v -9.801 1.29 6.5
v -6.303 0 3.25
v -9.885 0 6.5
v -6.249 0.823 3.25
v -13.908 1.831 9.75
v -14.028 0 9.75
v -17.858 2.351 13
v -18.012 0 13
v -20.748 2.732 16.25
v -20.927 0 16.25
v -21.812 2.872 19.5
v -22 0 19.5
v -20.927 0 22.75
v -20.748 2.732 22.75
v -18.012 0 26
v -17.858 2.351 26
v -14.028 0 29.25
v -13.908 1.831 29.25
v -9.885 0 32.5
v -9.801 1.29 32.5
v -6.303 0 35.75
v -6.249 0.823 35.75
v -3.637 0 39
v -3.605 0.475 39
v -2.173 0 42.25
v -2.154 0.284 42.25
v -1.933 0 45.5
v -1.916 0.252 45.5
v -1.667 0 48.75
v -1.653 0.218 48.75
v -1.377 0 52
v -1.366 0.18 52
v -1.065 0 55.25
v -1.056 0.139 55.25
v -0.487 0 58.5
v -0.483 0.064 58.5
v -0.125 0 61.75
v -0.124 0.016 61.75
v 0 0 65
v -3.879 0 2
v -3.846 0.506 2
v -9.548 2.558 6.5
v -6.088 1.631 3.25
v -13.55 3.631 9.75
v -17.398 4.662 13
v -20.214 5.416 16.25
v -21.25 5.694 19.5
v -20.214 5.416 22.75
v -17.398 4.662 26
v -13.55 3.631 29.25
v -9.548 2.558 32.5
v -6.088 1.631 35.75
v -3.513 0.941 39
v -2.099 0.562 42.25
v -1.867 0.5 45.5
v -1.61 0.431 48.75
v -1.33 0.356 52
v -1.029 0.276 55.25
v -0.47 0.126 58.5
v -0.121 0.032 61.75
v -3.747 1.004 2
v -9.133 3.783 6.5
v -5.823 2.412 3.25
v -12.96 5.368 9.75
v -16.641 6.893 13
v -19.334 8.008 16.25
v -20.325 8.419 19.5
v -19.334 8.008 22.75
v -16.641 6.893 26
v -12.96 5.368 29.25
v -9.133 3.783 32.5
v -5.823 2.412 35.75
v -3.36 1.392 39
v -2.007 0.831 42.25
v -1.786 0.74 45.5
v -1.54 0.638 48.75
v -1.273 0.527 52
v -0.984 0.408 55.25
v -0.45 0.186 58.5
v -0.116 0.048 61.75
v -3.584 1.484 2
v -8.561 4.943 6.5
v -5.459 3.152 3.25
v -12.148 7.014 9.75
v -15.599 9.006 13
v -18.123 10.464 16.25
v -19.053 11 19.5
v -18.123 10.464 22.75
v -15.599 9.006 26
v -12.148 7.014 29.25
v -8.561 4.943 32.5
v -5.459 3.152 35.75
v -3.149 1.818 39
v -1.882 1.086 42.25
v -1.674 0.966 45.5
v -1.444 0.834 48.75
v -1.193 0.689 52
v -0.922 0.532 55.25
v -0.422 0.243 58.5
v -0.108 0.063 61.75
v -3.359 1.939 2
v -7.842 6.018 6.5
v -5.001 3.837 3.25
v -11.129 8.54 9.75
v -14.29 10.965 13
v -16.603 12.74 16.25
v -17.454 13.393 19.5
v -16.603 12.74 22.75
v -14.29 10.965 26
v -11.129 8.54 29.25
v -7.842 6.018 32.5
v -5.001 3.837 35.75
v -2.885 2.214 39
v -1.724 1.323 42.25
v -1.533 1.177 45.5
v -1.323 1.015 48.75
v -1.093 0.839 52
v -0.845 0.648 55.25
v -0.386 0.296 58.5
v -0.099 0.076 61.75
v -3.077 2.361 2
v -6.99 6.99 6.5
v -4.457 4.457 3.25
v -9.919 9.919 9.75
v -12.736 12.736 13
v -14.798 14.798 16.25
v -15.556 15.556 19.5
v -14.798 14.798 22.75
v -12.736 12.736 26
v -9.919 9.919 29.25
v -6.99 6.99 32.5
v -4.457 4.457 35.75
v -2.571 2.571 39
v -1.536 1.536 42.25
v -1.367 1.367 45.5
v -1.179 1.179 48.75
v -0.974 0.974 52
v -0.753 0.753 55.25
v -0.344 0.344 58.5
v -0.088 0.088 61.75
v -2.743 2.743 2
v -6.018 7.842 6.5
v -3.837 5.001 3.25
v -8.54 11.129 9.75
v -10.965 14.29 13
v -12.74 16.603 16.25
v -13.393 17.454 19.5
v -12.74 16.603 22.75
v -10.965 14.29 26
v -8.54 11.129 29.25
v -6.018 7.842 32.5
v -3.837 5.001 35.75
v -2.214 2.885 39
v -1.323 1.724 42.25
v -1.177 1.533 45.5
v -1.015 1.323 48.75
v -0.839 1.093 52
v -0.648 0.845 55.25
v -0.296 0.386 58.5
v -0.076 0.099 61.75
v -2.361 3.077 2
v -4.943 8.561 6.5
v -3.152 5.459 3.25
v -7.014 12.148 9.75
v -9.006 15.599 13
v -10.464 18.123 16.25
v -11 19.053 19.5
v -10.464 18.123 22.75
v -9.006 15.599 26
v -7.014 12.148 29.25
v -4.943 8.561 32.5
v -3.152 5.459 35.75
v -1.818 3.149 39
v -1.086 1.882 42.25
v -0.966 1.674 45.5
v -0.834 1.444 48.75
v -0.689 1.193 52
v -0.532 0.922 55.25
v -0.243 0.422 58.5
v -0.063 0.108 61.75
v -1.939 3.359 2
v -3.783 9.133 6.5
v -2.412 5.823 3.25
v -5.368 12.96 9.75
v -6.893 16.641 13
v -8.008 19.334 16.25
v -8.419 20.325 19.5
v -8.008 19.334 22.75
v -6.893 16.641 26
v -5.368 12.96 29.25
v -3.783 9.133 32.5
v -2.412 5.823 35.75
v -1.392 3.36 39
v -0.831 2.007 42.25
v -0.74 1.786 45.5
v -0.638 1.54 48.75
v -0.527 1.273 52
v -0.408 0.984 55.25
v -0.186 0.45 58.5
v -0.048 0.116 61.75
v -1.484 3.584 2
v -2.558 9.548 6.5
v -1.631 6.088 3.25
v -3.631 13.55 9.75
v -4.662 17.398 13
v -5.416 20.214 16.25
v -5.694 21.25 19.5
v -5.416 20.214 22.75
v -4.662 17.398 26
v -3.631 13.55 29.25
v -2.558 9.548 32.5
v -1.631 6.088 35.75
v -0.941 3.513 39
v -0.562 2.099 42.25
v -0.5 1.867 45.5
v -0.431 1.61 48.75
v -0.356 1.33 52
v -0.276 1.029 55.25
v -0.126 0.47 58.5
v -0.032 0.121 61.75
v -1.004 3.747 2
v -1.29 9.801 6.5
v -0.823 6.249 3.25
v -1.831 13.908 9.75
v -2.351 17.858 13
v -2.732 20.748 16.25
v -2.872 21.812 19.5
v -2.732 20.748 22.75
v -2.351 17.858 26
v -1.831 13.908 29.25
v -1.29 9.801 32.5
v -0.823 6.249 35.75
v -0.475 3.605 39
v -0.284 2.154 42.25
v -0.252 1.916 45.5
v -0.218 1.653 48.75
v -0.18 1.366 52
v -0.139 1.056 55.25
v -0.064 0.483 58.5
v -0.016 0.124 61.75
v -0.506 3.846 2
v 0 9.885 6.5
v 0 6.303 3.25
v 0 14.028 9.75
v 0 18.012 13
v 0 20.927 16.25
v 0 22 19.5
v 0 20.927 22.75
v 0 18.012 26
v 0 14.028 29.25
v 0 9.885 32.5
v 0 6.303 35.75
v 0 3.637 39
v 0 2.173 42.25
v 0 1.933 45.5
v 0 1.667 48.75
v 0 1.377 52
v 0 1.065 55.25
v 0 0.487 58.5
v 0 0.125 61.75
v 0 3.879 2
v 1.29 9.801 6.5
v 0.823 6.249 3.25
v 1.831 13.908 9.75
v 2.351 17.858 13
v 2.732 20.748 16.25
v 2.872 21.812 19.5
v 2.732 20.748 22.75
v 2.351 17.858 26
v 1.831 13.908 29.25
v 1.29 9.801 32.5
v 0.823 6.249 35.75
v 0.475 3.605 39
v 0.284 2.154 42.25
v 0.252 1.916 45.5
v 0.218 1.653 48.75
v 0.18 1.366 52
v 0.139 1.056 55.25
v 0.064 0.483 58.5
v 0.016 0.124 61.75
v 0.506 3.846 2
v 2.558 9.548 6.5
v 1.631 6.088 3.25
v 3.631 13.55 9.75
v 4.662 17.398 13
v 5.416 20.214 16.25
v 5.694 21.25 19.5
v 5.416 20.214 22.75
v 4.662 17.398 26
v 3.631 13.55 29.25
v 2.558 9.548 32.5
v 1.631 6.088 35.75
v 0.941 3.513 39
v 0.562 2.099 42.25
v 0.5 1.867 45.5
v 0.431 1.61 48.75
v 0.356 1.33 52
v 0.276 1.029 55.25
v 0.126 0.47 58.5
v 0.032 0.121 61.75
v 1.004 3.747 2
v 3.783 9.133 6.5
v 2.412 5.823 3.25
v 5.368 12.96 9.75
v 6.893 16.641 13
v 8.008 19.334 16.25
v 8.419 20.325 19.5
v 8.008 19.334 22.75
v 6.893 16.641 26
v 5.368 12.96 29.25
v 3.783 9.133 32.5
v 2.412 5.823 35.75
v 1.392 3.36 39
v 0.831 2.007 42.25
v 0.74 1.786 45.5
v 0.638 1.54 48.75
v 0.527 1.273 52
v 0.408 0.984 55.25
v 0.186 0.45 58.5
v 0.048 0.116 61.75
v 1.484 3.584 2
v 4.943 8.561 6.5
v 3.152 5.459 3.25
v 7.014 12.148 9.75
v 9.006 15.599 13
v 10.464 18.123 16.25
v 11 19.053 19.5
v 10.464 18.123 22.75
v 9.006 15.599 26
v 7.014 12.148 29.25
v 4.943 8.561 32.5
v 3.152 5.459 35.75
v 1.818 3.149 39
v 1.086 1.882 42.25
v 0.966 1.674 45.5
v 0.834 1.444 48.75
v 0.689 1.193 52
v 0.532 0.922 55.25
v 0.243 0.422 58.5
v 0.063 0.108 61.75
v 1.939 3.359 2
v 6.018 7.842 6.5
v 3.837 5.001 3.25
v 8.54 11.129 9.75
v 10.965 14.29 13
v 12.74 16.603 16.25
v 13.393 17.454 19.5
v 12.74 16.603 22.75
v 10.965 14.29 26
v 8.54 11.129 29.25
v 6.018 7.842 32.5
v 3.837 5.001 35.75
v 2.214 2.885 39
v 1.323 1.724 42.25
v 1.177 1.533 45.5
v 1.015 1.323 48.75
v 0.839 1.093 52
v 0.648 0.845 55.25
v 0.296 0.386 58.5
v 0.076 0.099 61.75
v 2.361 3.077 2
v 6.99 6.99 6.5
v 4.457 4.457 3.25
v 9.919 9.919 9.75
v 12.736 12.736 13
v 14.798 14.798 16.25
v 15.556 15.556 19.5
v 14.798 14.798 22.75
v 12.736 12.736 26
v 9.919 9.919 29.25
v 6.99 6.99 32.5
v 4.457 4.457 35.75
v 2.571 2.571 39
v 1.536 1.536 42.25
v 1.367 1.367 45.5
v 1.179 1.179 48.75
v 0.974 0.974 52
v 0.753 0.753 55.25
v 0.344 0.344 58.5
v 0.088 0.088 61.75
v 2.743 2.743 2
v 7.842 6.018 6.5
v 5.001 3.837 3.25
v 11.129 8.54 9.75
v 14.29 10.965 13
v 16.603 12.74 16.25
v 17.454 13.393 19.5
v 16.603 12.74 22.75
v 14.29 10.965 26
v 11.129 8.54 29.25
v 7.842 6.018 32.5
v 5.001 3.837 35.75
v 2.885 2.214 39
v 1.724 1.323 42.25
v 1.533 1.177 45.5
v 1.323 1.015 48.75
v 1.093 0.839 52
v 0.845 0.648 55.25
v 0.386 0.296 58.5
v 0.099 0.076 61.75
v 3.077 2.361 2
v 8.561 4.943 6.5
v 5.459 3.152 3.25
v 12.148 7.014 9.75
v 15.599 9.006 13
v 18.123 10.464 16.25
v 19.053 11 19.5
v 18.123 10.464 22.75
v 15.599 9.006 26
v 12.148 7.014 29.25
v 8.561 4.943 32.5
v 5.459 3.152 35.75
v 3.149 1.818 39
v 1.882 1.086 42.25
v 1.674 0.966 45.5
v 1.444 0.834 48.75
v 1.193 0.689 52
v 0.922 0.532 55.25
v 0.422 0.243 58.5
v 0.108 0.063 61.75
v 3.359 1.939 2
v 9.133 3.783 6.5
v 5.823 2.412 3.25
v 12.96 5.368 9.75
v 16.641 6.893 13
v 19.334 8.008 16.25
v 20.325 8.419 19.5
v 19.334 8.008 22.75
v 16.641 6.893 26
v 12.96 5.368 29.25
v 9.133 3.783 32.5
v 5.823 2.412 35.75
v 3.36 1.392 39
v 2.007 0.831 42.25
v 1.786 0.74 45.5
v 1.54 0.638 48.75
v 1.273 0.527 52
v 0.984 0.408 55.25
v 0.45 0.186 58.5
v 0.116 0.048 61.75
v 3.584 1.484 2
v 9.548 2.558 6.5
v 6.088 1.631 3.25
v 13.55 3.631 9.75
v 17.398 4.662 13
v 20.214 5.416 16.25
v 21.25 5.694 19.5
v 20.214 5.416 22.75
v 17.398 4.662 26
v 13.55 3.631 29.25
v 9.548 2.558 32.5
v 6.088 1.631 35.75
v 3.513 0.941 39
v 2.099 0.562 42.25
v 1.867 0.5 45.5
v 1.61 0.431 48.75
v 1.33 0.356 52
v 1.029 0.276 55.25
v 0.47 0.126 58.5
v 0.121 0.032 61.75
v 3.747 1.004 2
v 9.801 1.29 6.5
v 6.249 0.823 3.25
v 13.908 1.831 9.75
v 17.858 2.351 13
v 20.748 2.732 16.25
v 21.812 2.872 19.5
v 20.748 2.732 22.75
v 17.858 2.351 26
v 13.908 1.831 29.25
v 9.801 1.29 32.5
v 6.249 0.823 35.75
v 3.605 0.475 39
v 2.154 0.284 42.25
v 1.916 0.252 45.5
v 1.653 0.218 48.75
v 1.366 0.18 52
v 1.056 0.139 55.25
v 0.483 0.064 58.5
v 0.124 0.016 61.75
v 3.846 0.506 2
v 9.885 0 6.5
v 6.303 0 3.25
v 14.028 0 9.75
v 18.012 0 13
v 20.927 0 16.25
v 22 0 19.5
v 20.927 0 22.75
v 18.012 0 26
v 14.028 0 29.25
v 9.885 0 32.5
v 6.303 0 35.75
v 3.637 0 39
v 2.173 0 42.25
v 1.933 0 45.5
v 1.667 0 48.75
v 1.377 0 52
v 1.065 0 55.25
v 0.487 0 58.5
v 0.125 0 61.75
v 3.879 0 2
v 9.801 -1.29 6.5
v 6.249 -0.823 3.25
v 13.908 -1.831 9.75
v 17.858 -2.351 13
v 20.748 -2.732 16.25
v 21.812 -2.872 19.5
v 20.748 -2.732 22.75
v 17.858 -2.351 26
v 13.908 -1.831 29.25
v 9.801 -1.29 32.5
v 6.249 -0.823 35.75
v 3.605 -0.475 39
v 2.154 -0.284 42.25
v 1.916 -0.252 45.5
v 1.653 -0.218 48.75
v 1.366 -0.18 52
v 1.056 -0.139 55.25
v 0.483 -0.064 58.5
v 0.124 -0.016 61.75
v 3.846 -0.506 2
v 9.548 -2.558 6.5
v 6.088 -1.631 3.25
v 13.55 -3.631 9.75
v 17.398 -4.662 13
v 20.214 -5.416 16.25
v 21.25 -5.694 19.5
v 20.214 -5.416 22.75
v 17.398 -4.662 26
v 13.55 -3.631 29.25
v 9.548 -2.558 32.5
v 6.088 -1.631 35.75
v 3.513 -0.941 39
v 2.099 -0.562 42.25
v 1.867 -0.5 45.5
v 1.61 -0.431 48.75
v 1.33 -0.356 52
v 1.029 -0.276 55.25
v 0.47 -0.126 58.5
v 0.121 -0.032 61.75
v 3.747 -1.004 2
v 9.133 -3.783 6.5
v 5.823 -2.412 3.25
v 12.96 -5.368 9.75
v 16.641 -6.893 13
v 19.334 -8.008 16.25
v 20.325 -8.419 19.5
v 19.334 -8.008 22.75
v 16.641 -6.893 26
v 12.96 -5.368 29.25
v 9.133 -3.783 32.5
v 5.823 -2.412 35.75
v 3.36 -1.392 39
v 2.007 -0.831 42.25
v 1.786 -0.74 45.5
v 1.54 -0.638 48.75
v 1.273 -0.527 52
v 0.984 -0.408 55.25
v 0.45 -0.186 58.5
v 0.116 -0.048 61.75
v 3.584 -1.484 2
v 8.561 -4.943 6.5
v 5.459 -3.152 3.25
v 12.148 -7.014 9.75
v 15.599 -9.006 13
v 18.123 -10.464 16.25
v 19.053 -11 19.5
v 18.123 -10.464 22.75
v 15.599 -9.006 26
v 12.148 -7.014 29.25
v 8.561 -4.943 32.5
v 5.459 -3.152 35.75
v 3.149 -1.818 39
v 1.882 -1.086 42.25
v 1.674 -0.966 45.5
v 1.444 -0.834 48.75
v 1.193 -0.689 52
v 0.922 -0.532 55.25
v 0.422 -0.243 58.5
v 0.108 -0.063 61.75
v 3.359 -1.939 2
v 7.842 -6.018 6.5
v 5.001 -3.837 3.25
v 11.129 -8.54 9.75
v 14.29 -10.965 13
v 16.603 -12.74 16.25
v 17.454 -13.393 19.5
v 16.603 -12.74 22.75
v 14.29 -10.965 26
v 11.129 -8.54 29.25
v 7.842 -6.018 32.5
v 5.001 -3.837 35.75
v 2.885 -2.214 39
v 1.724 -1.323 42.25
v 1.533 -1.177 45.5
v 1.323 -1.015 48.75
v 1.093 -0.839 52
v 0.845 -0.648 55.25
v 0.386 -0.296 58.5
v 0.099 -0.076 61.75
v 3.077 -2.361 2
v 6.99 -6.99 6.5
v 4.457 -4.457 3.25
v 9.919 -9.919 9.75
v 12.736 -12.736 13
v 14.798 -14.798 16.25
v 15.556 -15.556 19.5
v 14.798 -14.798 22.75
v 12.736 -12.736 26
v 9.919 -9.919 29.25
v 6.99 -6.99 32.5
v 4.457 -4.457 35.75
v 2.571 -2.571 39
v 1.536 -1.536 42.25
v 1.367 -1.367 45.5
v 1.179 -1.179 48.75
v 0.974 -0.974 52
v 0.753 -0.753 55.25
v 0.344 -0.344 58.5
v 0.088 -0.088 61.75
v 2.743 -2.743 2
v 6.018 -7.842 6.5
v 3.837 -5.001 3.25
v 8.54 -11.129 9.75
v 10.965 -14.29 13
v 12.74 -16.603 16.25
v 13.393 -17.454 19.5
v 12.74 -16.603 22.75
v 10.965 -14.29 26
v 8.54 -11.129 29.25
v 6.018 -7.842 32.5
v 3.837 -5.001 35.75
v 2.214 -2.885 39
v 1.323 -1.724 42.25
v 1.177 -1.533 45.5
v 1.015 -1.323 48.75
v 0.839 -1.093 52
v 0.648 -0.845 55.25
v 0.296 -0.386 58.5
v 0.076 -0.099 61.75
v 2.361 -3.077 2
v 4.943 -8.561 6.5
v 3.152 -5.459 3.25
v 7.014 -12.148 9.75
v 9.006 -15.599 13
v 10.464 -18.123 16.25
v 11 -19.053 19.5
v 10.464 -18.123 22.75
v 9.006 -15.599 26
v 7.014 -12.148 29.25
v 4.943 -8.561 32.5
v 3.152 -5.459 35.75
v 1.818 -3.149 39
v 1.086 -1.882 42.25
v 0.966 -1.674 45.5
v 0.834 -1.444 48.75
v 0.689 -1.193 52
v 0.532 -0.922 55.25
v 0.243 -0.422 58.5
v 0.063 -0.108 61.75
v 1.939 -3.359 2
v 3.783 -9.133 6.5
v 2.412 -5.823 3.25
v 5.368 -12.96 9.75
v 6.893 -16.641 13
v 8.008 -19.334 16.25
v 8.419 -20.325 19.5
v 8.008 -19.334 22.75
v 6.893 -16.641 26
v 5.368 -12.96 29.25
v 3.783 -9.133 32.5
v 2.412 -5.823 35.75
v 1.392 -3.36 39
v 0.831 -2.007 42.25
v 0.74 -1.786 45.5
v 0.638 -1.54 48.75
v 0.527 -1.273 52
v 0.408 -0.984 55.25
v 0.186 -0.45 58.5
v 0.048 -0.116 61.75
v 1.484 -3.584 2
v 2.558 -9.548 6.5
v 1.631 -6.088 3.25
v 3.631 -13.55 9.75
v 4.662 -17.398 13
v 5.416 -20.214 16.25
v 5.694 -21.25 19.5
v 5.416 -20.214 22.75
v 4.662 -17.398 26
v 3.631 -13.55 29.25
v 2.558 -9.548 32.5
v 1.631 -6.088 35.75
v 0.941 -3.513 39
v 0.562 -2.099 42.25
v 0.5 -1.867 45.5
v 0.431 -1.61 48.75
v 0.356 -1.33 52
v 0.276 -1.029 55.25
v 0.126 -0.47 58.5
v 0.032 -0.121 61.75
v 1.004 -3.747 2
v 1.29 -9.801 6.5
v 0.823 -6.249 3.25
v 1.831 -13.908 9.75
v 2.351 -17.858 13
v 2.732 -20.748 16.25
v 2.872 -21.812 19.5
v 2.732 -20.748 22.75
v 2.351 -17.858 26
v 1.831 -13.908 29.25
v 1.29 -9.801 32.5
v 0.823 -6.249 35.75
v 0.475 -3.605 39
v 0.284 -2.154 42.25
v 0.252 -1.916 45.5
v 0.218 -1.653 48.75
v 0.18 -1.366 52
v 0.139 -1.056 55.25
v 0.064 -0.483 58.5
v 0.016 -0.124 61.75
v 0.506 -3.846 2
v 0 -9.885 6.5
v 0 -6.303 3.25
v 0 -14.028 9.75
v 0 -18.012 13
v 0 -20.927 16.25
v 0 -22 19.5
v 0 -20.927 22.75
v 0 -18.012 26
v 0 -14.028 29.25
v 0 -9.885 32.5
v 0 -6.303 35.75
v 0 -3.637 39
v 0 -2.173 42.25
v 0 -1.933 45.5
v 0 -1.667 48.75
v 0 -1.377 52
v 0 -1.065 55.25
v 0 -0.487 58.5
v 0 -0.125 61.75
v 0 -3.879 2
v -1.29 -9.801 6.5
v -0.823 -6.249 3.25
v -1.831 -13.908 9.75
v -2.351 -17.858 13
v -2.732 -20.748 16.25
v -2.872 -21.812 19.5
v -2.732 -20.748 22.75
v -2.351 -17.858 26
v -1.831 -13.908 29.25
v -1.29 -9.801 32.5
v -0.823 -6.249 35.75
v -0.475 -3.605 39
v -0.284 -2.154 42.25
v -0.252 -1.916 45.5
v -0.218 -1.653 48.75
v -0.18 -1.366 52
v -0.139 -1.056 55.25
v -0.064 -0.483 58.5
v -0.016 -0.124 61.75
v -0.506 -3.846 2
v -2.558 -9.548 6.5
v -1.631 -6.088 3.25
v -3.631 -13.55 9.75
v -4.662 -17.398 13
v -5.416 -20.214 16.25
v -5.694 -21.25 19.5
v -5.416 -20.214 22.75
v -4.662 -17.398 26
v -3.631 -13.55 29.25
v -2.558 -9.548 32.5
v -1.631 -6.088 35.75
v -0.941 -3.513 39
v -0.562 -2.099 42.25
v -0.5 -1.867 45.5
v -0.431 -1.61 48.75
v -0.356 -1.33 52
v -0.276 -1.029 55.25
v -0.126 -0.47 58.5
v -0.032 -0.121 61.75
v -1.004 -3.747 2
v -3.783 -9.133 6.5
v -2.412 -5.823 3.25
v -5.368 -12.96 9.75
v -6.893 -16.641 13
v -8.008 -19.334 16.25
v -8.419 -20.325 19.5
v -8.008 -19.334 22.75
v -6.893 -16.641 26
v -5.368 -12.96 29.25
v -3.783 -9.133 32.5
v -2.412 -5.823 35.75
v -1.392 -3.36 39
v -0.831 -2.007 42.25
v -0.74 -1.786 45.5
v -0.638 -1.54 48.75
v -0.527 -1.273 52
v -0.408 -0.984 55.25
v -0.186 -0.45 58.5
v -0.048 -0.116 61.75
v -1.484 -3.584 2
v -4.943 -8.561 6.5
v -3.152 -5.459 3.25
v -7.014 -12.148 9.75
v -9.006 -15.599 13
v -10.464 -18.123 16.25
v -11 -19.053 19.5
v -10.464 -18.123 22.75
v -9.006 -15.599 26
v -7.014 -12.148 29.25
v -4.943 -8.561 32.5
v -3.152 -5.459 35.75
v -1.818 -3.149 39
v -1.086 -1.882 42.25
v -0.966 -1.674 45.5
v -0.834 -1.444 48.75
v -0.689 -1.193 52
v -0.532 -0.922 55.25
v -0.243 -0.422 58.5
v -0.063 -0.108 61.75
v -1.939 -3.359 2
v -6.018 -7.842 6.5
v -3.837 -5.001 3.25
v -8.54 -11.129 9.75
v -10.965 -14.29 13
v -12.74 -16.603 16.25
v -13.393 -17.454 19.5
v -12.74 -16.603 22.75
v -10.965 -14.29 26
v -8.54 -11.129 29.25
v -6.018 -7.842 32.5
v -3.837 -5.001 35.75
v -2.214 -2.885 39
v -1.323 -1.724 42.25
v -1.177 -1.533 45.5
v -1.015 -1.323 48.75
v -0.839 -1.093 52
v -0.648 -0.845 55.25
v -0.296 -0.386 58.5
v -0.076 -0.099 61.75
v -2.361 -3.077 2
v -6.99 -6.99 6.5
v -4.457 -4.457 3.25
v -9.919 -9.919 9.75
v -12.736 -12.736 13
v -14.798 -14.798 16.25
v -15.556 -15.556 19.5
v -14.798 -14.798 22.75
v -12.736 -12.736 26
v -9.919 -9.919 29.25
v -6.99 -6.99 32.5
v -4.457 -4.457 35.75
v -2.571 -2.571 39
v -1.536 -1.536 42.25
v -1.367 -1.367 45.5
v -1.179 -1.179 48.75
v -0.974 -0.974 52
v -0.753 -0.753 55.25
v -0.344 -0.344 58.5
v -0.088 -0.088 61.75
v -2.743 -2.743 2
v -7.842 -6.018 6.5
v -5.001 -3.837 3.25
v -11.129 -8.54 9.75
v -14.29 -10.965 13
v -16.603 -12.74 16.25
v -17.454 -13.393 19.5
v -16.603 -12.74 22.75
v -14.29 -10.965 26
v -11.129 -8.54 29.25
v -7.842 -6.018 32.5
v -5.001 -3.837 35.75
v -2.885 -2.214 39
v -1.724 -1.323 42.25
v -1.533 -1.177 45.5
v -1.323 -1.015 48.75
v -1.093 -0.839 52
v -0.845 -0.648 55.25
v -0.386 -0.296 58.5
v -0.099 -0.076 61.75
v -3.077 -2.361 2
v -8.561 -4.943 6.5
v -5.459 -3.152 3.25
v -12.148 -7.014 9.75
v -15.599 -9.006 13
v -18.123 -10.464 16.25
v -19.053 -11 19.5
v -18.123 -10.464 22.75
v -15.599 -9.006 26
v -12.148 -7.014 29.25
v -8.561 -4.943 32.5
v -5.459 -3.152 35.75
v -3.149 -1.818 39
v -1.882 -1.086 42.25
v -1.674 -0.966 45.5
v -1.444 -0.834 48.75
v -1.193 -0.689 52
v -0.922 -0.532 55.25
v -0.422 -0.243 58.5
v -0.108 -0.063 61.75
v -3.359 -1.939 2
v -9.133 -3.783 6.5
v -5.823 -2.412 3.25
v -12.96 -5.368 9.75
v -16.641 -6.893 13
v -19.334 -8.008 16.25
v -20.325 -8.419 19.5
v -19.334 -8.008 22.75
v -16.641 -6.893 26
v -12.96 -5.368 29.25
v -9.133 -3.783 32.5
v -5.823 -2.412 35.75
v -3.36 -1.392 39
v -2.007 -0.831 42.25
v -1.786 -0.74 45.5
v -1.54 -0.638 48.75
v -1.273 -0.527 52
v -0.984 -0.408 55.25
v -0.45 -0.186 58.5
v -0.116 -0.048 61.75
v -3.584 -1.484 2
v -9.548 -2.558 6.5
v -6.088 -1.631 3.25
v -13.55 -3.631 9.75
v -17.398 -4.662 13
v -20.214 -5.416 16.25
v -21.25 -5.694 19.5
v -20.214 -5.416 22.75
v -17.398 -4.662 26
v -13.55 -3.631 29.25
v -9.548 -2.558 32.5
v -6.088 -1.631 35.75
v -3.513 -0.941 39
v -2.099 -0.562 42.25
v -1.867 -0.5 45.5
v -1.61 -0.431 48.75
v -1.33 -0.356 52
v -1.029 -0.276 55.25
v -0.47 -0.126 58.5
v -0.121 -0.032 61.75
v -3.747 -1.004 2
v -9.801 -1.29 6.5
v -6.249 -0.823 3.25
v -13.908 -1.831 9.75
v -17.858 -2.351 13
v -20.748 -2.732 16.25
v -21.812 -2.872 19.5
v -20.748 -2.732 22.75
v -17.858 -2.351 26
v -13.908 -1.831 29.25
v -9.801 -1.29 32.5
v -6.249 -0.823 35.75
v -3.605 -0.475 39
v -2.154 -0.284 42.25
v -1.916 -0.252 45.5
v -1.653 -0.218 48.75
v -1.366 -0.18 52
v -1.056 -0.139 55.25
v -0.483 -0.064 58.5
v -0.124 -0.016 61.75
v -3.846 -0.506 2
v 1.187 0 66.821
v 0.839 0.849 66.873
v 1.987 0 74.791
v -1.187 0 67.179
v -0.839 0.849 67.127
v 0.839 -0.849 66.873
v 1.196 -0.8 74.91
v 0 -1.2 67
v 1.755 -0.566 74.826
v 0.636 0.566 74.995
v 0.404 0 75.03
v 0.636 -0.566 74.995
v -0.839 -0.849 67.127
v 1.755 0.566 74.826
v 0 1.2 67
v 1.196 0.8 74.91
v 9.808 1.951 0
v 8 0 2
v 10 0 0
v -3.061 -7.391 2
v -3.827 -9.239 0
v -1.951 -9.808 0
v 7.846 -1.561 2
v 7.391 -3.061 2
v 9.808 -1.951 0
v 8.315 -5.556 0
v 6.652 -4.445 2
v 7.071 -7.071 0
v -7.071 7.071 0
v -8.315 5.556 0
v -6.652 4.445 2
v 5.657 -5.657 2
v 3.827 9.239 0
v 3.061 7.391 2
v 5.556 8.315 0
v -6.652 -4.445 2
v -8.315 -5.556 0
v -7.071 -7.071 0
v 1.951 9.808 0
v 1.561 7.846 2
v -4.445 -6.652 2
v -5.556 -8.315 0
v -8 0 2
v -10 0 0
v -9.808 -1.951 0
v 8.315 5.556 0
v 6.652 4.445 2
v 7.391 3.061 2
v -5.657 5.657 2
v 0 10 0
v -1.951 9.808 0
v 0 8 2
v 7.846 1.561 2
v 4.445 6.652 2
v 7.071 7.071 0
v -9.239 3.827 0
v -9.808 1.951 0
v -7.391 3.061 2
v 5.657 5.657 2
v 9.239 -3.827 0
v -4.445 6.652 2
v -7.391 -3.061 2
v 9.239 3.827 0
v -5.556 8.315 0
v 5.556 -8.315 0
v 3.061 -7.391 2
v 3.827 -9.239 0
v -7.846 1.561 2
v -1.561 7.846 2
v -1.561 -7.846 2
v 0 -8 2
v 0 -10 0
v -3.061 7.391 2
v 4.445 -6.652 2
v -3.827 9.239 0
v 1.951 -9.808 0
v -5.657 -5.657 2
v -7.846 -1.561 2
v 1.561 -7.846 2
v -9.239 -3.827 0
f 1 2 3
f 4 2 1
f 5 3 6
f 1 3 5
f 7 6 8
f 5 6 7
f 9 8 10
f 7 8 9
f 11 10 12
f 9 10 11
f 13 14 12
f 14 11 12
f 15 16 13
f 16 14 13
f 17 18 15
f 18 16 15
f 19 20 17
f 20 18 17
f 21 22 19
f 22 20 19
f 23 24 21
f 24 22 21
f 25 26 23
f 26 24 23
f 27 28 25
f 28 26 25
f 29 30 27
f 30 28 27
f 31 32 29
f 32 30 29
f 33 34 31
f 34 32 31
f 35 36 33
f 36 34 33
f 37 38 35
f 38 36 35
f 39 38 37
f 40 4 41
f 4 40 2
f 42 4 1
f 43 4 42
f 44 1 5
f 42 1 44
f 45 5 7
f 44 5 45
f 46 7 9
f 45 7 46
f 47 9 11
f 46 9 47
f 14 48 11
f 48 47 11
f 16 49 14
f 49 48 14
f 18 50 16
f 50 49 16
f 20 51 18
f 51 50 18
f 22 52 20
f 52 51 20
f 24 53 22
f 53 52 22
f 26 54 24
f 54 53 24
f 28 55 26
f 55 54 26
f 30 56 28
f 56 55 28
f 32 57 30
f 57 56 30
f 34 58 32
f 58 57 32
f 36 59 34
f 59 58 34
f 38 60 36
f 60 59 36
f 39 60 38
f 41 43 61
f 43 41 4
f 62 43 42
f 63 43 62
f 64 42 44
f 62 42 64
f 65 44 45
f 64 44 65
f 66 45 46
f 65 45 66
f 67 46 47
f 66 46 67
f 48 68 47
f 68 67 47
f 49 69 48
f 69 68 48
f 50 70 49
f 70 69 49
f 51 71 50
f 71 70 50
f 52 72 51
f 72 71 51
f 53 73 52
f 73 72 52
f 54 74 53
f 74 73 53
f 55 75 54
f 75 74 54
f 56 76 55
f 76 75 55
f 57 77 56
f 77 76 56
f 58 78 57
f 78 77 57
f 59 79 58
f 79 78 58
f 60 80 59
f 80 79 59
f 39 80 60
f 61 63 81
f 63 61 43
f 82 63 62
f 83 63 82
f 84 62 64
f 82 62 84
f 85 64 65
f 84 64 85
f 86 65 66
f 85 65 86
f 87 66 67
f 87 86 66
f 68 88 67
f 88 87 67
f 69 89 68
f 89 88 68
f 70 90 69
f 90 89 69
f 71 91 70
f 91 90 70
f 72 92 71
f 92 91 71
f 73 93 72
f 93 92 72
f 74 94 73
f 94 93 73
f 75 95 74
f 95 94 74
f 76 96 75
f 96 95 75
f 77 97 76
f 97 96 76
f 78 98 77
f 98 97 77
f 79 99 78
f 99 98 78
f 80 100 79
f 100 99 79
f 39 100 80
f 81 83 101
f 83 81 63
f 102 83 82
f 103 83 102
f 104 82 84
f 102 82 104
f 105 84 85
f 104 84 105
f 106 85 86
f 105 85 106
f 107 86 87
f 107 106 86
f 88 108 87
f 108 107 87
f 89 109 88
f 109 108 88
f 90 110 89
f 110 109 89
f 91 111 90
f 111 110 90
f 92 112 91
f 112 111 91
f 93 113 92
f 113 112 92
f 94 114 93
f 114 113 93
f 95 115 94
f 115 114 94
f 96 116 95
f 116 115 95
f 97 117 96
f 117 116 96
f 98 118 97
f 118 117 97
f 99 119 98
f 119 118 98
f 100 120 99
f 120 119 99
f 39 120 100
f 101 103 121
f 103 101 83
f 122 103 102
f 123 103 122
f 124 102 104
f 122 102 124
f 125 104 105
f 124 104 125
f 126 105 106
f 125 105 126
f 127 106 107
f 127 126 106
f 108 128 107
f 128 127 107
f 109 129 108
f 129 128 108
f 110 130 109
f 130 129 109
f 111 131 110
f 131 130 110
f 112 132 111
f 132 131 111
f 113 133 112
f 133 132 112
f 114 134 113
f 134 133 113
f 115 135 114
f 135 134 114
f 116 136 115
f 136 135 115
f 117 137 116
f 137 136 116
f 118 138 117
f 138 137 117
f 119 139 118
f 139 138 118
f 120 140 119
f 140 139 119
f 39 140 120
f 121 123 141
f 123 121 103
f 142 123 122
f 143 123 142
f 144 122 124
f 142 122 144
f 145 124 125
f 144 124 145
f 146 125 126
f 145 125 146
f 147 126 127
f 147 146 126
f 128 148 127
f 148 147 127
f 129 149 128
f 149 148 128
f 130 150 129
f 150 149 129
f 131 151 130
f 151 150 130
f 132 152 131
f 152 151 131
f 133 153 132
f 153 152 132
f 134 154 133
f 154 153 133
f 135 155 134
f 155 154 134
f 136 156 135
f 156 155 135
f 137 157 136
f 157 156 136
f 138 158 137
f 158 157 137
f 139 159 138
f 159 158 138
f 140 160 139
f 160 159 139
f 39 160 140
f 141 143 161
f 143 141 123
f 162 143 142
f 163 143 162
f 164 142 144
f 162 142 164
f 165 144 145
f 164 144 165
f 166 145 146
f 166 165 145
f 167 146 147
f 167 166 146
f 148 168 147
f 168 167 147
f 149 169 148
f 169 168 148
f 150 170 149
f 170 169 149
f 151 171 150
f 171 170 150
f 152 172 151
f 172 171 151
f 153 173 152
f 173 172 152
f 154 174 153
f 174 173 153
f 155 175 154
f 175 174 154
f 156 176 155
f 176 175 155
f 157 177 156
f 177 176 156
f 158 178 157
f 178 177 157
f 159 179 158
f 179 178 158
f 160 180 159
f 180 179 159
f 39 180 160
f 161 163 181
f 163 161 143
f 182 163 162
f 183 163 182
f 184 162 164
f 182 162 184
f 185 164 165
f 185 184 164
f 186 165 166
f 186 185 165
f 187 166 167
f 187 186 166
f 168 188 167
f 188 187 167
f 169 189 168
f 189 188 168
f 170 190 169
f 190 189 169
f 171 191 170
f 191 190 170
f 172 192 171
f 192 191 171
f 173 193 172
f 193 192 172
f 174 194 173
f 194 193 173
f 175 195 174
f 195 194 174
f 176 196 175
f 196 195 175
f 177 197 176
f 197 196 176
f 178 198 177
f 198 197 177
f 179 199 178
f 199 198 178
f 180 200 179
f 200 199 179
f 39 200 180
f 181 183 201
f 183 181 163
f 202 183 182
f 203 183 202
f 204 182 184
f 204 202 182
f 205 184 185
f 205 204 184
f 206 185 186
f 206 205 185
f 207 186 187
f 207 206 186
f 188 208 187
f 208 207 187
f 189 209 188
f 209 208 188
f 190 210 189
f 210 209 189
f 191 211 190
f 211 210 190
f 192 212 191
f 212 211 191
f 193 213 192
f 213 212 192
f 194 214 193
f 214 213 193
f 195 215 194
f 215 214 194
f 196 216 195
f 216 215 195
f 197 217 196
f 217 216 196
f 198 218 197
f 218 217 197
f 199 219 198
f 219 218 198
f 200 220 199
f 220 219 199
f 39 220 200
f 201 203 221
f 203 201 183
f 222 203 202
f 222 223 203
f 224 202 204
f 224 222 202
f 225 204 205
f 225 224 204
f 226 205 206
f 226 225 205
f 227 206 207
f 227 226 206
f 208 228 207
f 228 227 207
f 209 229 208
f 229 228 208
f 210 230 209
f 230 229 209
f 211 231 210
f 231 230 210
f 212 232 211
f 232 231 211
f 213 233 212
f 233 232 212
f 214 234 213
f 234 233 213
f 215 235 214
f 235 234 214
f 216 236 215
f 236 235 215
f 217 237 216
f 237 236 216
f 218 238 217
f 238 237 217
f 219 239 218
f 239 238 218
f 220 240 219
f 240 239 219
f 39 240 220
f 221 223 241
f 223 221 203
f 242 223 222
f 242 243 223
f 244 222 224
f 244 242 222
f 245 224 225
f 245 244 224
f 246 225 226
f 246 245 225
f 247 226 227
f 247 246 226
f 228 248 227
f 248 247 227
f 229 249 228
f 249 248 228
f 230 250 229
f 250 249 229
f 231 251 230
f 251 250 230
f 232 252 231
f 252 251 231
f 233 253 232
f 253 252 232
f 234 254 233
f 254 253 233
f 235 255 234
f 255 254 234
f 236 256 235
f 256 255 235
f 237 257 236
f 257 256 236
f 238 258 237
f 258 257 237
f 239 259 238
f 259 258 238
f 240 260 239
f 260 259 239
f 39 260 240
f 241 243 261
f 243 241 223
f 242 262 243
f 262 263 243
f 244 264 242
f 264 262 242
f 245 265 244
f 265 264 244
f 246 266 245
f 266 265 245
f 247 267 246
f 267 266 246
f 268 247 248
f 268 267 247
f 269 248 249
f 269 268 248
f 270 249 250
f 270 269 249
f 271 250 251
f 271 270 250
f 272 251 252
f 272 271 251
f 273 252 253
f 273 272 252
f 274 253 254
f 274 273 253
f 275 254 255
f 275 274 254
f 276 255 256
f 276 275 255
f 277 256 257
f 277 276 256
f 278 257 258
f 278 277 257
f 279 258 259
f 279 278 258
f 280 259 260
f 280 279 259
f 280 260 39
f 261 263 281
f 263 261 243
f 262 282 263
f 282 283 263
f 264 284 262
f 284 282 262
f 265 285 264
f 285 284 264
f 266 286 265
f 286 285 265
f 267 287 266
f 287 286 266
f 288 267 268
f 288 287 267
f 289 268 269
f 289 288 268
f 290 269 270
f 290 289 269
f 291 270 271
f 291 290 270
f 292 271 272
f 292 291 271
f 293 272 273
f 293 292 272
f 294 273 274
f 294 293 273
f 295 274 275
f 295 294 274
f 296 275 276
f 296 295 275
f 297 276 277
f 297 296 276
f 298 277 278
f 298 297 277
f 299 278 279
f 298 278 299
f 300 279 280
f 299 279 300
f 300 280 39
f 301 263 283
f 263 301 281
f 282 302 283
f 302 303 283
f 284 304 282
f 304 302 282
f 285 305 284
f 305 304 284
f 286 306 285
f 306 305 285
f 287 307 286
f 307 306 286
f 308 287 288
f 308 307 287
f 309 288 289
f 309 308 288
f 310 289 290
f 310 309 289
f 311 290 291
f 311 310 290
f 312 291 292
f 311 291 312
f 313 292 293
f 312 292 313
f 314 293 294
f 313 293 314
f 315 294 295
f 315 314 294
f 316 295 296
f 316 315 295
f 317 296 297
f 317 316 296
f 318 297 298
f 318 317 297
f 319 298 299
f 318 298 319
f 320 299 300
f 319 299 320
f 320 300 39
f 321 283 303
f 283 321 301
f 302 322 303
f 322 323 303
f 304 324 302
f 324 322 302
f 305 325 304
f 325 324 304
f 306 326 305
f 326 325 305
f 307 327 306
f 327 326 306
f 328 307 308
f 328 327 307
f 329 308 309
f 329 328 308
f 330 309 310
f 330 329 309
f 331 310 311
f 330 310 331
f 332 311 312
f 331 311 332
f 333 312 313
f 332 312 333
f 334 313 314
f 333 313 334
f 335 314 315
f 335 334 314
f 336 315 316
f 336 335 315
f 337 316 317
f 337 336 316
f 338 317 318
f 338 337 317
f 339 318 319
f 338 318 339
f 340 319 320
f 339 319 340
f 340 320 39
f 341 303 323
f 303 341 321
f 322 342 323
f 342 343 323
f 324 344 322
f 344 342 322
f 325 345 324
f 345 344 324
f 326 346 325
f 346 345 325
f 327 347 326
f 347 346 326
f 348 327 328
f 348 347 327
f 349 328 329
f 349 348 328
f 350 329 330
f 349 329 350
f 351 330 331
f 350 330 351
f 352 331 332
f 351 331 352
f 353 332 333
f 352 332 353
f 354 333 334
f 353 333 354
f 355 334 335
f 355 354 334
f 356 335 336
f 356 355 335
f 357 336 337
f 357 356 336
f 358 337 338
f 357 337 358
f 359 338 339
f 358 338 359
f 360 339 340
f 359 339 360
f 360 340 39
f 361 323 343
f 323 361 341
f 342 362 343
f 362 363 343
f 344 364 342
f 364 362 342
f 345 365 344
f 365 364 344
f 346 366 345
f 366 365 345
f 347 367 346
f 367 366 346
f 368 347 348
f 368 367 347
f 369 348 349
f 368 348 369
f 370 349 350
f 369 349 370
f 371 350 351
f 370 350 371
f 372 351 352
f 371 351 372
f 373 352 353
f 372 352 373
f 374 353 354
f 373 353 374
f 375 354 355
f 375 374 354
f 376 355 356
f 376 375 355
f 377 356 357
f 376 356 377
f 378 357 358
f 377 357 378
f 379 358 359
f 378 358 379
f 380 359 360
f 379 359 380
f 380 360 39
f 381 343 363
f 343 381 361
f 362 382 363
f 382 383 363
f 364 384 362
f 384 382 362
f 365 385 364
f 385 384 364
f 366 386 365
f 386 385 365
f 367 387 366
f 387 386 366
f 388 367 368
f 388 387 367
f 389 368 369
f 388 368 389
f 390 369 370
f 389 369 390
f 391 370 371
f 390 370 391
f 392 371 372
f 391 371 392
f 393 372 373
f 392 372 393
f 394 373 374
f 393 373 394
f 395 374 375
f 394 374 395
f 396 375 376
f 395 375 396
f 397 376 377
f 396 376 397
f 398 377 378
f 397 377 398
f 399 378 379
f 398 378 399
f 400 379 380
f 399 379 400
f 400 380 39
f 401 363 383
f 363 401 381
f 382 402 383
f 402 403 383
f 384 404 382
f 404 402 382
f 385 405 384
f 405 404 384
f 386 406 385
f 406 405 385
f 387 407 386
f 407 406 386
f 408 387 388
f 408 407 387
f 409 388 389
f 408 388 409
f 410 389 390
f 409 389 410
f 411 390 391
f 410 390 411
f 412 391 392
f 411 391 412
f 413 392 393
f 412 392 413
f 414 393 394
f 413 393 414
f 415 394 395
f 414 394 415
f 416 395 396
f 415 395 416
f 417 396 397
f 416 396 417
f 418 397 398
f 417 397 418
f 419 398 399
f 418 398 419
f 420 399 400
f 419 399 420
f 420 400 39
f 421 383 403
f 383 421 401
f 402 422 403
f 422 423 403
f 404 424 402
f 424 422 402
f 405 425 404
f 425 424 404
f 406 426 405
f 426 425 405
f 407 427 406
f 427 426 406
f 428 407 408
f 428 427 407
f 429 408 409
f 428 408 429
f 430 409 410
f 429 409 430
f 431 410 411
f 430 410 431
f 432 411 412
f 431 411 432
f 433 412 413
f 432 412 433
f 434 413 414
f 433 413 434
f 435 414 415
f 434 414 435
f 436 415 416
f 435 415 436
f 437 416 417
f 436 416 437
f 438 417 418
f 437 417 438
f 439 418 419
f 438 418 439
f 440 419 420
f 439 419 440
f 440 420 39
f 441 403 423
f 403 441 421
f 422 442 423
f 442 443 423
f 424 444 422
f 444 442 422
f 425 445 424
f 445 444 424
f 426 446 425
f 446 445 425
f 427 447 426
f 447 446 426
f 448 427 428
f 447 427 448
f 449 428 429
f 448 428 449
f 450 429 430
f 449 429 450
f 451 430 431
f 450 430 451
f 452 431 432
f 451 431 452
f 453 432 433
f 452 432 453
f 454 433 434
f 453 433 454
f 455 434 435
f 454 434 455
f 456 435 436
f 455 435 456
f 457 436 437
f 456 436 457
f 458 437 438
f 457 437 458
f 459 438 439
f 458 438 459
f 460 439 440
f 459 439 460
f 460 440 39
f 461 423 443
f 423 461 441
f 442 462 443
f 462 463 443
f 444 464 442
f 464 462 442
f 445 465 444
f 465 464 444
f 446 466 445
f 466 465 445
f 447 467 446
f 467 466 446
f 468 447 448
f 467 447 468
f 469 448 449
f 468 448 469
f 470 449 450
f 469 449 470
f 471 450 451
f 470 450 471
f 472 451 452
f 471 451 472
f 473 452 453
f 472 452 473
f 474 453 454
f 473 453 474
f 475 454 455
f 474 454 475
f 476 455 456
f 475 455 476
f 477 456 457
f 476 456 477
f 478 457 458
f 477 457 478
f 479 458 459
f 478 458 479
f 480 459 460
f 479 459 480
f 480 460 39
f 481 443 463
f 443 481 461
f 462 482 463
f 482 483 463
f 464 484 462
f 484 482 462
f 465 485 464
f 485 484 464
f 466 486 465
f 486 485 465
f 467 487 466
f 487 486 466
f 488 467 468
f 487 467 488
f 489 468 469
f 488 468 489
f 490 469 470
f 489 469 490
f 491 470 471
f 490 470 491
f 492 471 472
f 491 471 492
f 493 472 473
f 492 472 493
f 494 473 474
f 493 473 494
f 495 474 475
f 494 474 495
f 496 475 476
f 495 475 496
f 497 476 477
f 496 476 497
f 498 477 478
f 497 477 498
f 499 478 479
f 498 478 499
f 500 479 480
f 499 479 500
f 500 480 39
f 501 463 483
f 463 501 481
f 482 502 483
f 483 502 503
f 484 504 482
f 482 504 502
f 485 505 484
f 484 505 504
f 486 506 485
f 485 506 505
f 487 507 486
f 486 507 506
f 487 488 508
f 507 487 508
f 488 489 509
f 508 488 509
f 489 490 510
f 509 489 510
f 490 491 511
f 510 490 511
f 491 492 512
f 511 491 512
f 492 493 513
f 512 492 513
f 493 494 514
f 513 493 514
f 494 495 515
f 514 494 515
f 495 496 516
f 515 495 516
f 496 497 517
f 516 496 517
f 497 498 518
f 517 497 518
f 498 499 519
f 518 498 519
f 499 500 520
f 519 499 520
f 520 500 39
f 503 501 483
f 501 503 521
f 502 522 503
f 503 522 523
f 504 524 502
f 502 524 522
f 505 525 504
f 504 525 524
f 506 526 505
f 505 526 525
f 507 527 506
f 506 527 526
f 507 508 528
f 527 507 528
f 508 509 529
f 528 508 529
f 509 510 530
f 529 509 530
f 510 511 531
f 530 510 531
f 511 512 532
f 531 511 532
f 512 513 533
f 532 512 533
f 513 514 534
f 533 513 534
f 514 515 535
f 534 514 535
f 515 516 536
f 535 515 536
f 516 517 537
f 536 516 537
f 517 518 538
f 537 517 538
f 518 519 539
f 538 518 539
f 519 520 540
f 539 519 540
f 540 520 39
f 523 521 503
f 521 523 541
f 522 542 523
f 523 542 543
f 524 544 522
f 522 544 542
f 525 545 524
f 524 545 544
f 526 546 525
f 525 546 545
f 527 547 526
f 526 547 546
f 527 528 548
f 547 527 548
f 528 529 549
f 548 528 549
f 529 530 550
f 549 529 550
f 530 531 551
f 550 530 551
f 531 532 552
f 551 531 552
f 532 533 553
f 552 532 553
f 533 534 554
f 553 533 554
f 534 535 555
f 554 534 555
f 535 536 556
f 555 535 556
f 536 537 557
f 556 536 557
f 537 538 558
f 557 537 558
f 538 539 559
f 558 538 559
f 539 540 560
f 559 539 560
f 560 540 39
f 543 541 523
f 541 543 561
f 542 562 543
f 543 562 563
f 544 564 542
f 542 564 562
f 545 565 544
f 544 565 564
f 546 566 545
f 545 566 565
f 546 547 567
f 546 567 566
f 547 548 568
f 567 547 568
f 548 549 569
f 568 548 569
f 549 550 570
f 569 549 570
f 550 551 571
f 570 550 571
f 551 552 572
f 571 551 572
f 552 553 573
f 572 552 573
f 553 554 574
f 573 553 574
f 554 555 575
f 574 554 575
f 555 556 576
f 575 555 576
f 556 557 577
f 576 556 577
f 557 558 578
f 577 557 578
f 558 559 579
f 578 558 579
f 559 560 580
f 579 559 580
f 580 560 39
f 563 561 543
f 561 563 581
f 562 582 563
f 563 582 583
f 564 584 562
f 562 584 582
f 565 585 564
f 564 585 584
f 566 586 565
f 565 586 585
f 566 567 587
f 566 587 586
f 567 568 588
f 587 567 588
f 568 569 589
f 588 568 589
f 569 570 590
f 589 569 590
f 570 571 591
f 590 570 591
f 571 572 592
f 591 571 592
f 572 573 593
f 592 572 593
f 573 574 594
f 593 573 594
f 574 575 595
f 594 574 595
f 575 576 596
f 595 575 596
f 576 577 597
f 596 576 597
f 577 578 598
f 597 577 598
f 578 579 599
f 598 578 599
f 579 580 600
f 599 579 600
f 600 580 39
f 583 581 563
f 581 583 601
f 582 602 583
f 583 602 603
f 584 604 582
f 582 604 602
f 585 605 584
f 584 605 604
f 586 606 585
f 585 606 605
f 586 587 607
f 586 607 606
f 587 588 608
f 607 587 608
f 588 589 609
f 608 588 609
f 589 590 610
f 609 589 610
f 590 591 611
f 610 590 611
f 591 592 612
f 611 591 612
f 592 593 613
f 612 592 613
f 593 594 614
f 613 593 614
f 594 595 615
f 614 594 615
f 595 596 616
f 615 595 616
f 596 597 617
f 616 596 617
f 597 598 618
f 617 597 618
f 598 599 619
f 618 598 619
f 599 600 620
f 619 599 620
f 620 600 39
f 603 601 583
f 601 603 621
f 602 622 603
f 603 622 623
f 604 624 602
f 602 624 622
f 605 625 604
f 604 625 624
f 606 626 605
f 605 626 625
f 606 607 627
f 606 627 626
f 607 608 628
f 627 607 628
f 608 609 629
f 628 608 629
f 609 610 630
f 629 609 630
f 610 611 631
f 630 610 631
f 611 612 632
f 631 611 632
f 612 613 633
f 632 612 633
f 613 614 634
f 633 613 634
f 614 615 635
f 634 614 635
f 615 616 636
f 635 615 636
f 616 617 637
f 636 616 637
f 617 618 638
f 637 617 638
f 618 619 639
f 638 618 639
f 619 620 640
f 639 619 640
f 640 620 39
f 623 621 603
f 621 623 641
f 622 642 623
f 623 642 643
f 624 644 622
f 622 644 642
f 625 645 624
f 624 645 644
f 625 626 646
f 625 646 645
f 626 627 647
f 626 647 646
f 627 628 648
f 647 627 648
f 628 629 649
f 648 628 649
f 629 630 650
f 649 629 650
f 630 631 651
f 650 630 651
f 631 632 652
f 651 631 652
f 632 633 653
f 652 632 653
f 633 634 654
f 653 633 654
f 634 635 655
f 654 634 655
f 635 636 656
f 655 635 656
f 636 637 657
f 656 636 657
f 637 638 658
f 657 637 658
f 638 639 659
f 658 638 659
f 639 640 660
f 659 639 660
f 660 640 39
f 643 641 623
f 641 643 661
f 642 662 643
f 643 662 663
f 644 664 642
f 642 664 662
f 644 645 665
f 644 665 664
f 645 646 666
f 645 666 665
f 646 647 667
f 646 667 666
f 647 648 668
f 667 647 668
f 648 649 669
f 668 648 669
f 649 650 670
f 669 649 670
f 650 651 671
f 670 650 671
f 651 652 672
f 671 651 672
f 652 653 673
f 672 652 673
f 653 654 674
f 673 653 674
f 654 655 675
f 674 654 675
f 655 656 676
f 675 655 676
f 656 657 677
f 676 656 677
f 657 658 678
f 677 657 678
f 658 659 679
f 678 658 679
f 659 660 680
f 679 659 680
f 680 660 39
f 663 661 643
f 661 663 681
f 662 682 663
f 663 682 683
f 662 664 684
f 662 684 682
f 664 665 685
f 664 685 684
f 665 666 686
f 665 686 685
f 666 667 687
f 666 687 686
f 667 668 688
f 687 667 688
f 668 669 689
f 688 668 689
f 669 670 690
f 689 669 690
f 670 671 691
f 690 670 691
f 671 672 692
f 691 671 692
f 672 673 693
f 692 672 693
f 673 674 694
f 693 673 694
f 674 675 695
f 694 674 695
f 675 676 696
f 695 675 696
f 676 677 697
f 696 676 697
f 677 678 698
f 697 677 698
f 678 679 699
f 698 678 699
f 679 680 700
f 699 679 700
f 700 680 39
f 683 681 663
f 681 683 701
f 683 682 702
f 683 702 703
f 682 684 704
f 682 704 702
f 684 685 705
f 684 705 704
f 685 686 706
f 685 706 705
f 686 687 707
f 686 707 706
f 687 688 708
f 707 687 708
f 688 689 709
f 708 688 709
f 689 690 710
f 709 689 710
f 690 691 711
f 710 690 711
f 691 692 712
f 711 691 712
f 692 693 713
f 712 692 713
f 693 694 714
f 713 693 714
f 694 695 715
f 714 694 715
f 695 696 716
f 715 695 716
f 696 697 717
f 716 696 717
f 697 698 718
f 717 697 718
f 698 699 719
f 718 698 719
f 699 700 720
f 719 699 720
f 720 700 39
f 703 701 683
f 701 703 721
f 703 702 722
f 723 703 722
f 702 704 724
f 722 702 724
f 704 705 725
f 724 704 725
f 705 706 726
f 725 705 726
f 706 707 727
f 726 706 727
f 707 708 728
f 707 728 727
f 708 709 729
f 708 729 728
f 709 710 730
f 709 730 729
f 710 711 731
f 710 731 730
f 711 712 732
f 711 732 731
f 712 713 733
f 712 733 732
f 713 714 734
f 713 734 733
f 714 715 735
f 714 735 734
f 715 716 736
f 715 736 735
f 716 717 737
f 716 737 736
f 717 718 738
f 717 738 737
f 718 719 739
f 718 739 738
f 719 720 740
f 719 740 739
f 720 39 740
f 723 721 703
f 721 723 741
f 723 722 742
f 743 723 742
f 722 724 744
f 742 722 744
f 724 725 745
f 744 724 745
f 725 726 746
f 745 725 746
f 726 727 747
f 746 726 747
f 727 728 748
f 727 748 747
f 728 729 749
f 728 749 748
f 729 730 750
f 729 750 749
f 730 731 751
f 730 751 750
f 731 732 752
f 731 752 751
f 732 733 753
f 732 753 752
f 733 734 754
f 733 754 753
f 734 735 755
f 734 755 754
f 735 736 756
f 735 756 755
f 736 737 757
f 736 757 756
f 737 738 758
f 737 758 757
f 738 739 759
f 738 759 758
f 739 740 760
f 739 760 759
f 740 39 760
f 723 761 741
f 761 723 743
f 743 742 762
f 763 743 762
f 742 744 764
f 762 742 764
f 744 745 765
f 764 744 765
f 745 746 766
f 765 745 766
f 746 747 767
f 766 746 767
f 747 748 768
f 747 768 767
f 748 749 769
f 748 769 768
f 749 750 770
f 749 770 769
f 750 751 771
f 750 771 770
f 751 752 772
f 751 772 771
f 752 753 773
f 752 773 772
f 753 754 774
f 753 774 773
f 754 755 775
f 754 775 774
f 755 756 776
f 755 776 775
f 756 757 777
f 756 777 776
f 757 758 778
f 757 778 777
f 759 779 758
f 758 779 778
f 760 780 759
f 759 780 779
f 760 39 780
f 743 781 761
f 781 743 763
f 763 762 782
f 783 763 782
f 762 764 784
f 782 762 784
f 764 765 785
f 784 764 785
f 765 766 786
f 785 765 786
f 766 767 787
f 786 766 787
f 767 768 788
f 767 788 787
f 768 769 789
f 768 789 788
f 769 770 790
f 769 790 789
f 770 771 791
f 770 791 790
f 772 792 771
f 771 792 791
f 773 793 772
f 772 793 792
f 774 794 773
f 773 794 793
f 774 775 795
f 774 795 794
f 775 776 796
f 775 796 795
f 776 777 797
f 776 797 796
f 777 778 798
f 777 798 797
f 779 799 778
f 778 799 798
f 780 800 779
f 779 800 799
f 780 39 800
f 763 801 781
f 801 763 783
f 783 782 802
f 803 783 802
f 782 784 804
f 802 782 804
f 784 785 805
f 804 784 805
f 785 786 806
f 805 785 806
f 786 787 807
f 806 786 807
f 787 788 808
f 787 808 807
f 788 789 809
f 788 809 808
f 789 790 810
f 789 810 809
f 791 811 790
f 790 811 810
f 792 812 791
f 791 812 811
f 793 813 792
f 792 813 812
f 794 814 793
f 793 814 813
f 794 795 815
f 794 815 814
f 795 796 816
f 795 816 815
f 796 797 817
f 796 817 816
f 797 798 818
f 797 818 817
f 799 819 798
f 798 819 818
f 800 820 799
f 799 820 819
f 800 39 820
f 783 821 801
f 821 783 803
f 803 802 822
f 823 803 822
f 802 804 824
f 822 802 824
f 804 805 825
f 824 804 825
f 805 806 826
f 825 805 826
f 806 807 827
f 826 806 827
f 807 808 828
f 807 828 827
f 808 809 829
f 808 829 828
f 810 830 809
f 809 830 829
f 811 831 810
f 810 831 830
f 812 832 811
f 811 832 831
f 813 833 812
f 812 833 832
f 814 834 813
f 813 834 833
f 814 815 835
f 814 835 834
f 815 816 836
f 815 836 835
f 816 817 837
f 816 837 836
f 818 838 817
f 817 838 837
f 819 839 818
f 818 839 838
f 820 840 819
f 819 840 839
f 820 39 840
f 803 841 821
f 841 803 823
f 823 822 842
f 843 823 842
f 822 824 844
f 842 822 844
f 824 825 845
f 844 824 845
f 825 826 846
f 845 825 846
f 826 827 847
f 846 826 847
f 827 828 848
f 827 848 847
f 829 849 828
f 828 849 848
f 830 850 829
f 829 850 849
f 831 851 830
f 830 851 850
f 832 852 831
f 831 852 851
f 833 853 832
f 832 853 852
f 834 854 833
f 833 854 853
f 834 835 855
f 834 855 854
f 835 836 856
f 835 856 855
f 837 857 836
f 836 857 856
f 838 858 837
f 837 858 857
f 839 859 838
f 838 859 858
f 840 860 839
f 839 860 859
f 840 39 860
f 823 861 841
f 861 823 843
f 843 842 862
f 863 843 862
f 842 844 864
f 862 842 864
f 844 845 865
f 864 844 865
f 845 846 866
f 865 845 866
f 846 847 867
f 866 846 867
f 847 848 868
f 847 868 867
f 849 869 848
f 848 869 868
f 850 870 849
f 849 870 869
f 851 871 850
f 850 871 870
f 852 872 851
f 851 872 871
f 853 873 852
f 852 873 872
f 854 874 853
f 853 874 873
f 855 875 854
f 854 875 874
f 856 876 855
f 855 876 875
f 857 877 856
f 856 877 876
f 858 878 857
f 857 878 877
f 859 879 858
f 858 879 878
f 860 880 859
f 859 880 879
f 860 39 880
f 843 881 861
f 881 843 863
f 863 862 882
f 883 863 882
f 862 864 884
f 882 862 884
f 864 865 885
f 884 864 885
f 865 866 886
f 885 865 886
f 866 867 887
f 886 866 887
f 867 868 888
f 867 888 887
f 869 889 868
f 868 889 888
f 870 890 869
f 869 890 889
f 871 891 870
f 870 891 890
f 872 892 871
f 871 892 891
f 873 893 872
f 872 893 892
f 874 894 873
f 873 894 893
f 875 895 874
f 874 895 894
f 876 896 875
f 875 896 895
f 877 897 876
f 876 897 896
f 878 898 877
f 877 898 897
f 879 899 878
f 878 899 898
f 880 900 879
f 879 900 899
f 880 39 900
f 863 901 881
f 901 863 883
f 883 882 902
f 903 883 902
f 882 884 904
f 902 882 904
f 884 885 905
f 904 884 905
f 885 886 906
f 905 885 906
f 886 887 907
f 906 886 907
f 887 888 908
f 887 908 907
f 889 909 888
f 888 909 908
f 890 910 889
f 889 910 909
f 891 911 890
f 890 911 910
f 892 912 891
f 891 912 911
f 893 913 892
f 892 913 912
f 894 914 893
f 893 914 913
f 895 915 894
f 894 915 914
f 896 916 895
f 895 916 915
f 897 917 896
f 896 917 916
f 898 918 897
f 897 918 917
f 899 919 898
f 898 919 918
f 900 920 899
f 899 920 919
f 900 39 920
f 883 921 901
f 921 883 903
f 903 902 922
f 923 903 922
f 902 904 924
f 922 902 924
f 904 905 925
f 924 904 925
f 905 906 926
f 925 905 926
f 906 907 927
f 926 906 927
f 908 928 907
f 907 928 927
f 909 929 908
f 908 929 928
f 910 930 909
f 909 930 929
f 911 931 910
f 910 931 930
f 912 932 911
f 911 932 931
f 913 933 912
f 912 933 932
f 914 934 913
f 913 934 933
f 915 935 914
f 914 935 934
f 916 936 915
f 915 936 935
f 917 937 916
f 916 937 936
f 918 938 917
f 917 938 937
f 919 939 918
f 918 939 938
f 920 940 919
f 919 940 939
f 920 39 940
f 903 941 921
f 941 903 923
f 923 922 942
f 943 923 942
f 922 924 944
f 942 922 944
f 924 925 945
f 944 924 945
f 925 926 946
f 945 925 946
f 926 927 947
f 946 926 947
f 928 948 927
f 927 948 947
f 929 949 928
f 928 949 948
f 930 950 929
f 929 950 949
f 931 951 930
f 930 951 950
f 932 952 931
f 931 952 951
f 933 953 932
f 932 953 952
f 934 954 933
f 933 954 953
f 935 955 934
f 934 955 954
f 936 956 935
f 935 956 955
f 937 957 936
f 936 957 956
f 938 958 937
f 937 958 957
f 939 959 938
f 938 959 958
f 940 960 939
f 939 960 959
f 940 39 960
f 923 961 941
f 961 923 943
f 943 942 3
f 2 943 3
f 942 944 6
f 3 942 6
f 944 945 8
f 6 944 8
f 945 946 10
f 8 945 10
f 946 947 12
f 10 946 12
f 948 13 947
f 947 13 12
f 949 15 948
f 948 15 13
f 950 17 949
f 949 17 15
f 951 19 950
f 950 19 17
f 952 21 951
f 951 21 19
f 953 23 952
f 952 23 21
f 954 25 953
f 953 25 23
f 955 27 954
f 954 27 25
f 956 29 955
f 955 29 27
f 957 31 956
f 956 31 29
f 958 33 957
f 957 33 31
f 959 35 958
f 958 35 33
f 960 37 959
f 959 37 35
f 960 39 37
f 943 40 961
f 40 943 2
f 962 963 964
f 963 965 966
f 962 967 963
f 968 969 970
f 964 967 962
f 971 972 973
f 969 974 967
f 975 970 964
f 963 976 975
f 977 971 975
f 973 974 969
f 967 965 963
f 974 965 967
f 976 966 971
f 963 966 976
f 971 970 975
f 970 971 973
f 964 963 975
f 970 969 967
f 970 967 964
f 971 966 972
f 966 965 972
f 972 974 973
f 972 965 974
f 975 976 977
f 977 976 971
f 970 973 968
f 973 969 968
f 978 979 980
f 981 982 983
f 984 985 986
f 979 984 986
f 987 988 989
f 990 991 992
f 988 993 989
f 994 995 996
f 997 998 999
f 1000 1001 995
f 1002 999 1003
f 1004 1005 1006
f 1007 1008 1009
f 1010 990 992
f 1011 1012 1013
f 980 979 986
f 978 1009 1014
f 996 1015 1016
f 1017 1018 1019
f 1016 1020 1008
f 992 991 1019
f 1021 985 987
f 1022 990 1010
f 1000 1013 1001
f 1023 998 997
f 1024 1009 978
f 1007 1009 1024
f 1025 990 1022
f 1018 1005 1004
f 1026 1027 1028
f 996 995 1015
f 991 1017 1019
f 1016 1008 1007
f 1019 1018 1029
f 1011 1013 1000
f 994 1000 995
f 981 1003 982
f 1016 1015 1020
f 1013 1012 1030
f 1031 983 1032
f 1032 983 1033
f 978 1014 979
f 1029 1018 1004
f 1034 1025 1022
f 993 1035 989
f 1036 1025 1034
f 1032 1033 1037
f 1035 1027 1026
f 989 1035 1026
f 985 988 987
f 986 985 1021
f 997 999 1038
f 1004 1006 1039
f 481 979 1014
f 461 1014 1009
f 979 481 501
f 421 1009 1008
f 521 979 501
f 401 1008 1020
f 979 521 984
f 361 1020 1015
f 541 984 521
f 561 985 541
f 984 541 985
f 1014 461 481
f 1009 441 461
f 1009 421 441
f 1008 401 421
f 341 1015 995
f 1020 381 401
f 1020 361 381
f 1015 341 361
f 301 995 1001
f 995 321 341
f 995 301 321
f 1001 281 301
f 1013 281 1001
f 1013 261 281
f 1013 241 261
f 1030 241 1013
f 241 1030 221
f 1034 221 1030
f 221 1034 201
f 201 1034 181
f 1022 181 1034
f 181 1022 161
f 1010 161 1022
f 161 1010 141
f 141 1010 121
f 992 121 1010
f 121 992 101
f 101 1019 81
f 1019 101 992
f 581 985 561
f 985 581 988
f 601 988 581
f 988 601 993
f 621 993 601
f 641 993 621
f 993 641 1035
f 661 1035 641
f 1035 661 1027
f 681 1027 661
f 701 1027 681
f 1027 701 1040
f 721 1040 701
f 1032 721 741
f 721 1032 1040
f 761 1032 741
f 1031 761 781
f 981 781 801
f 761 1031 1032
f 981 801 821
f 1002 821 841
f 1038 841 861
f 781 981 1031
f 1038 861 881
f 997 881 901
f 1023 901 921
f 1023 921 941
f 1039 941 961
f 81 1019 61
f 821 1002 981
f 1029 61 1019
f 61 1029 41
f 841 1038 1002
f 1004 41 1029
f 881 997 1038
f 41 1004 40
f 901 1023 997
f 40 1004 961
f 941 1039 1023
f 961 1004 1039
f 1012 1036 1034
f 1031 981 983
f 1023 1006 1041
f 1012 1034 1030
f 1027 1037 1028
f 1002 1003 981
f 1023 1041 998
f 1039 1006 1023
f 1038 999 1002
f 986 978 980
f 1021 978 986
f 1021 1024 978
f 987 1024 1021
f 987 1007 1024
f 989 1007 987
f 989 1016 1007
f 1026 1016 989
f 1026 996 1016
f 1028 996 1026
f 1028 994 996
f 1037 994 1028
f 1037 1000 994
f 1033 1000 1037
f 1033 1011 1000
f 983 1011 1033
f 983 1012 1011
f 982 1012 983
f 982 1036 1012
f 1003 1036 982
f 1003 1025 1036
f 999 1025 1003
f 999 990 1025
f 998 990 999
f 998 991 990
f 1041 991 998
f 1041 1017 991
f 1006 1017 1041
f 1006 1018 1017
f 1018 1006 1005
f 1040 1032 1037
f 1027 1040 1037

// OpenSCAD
// Pear - Pineapple Party model definition
// Parameters are parsed by the JS viewer; modules render in OpenSCAD

/* [Model] */
name = "pear";
body_type = "lathe";

/* [Body] */
body_height = 65;
body_radius = 22;
body_color = "0xb5c327";
body_roughness = 0.55;
body_metalness = 0.05;

/* [Lathe Profile] */
profile_center = 0.3;
profile_width = 0.05;
profile_taper_scale = 0.35;

/* [Bumps] */
bump_type = "sphere";
bump_placement = "grid";
bump_size = 1.8;
bump_rows = 12;
bumps_per_row = 12;
bump_color = "0x8a9420";
bump_roughness = 0.65;
bump_metalness = 0.05;
bump_scale = [1, 1, 1];
bump_stagger = true;

/* [Crown] */
crown_y = 64;  // BH - 1
leaf_width = 5;
leaf_thickness = 1.5;
leaf_length = 18;
leaf_color = "0x1a5c1a";
leaf_roughness = 0.5;
leaf_metalness = 0.0;
leaf_placement = "crown";
leaf_rings = [[1, 30, 35, 1, 1, 1], [1, 210, 40, 0.8, 0.9, 0.8]];

/* [Base] */
base_r1 = 8;
base_r2 = 10;

/* [Stem] */
has_stem = true;
stem_r1 = 0.8;
stem_r2 = 1.2;
stem_height = 8;
stem_color = "0x5c3a1e";
stem_y = 67;  // BH + 2
stem_tilt = 0.15;

/* [Resolution] */
$fn = 64;

// =====================================================
// OpenSCAD rendering
// =====================================================
module pear_profile_radius(t) {
    // Returns radius at fraction t along height
    bottom = exp(-pow(t - profile_center, 2) / profile_width) * body_radius;
    taper = body_radius * profile_taper_scale * (1 - t) * sqrt(max(0, t));
    r = max(bottom, taper);
    r2 = (t > 0.85) ? r * (1 - t) / 0.15 : r;
    r3 = (t < 0.03) ? r2 * t / 0.03 : r2;
}

module pear_body() {
    steps = 20;
    pts = [for (i = [0:steps]) let(
        t = i / steps,
        bottom = exp(-pow(t - 0.3, 2) / 0.05) * body_radius,
        taper = body_radius * 0.35 * (1 - t) * sqrt(max(0, t)),
        r0 = max(bottom, taper),
        r1 = (t > 0.85) ? r0 * (1 - t) / 0.15 : r0,
        r = (t < 0.03) ? r1 * t / 0.03 : r1
    ) [max(r, 0), t * body_height]];

    rotate_extrude($fn = 48)
        polygon(concat([[0, 0]], pts, [[0, body_height]]));
}

module pear() {
    // Body
    color([0.71, 0.76, 0.15])
    pear_body();

    // Stem
    color([0.36, 0.23, 0.12])
    translate([0, 0, body_height + 2])
    rotate([0, stem_tilt * 180 / 3.14159, 0])
    cylinder(h = stem_height, r1 = stem_r2, r2 = stem_r1, $fn = 8);

    // Base
    color([0.71, 0.76, 0.15])
    cylinder(h = 2, r1 = base_r2, r2 = base_r1, $fn = 32);
}

pear();
